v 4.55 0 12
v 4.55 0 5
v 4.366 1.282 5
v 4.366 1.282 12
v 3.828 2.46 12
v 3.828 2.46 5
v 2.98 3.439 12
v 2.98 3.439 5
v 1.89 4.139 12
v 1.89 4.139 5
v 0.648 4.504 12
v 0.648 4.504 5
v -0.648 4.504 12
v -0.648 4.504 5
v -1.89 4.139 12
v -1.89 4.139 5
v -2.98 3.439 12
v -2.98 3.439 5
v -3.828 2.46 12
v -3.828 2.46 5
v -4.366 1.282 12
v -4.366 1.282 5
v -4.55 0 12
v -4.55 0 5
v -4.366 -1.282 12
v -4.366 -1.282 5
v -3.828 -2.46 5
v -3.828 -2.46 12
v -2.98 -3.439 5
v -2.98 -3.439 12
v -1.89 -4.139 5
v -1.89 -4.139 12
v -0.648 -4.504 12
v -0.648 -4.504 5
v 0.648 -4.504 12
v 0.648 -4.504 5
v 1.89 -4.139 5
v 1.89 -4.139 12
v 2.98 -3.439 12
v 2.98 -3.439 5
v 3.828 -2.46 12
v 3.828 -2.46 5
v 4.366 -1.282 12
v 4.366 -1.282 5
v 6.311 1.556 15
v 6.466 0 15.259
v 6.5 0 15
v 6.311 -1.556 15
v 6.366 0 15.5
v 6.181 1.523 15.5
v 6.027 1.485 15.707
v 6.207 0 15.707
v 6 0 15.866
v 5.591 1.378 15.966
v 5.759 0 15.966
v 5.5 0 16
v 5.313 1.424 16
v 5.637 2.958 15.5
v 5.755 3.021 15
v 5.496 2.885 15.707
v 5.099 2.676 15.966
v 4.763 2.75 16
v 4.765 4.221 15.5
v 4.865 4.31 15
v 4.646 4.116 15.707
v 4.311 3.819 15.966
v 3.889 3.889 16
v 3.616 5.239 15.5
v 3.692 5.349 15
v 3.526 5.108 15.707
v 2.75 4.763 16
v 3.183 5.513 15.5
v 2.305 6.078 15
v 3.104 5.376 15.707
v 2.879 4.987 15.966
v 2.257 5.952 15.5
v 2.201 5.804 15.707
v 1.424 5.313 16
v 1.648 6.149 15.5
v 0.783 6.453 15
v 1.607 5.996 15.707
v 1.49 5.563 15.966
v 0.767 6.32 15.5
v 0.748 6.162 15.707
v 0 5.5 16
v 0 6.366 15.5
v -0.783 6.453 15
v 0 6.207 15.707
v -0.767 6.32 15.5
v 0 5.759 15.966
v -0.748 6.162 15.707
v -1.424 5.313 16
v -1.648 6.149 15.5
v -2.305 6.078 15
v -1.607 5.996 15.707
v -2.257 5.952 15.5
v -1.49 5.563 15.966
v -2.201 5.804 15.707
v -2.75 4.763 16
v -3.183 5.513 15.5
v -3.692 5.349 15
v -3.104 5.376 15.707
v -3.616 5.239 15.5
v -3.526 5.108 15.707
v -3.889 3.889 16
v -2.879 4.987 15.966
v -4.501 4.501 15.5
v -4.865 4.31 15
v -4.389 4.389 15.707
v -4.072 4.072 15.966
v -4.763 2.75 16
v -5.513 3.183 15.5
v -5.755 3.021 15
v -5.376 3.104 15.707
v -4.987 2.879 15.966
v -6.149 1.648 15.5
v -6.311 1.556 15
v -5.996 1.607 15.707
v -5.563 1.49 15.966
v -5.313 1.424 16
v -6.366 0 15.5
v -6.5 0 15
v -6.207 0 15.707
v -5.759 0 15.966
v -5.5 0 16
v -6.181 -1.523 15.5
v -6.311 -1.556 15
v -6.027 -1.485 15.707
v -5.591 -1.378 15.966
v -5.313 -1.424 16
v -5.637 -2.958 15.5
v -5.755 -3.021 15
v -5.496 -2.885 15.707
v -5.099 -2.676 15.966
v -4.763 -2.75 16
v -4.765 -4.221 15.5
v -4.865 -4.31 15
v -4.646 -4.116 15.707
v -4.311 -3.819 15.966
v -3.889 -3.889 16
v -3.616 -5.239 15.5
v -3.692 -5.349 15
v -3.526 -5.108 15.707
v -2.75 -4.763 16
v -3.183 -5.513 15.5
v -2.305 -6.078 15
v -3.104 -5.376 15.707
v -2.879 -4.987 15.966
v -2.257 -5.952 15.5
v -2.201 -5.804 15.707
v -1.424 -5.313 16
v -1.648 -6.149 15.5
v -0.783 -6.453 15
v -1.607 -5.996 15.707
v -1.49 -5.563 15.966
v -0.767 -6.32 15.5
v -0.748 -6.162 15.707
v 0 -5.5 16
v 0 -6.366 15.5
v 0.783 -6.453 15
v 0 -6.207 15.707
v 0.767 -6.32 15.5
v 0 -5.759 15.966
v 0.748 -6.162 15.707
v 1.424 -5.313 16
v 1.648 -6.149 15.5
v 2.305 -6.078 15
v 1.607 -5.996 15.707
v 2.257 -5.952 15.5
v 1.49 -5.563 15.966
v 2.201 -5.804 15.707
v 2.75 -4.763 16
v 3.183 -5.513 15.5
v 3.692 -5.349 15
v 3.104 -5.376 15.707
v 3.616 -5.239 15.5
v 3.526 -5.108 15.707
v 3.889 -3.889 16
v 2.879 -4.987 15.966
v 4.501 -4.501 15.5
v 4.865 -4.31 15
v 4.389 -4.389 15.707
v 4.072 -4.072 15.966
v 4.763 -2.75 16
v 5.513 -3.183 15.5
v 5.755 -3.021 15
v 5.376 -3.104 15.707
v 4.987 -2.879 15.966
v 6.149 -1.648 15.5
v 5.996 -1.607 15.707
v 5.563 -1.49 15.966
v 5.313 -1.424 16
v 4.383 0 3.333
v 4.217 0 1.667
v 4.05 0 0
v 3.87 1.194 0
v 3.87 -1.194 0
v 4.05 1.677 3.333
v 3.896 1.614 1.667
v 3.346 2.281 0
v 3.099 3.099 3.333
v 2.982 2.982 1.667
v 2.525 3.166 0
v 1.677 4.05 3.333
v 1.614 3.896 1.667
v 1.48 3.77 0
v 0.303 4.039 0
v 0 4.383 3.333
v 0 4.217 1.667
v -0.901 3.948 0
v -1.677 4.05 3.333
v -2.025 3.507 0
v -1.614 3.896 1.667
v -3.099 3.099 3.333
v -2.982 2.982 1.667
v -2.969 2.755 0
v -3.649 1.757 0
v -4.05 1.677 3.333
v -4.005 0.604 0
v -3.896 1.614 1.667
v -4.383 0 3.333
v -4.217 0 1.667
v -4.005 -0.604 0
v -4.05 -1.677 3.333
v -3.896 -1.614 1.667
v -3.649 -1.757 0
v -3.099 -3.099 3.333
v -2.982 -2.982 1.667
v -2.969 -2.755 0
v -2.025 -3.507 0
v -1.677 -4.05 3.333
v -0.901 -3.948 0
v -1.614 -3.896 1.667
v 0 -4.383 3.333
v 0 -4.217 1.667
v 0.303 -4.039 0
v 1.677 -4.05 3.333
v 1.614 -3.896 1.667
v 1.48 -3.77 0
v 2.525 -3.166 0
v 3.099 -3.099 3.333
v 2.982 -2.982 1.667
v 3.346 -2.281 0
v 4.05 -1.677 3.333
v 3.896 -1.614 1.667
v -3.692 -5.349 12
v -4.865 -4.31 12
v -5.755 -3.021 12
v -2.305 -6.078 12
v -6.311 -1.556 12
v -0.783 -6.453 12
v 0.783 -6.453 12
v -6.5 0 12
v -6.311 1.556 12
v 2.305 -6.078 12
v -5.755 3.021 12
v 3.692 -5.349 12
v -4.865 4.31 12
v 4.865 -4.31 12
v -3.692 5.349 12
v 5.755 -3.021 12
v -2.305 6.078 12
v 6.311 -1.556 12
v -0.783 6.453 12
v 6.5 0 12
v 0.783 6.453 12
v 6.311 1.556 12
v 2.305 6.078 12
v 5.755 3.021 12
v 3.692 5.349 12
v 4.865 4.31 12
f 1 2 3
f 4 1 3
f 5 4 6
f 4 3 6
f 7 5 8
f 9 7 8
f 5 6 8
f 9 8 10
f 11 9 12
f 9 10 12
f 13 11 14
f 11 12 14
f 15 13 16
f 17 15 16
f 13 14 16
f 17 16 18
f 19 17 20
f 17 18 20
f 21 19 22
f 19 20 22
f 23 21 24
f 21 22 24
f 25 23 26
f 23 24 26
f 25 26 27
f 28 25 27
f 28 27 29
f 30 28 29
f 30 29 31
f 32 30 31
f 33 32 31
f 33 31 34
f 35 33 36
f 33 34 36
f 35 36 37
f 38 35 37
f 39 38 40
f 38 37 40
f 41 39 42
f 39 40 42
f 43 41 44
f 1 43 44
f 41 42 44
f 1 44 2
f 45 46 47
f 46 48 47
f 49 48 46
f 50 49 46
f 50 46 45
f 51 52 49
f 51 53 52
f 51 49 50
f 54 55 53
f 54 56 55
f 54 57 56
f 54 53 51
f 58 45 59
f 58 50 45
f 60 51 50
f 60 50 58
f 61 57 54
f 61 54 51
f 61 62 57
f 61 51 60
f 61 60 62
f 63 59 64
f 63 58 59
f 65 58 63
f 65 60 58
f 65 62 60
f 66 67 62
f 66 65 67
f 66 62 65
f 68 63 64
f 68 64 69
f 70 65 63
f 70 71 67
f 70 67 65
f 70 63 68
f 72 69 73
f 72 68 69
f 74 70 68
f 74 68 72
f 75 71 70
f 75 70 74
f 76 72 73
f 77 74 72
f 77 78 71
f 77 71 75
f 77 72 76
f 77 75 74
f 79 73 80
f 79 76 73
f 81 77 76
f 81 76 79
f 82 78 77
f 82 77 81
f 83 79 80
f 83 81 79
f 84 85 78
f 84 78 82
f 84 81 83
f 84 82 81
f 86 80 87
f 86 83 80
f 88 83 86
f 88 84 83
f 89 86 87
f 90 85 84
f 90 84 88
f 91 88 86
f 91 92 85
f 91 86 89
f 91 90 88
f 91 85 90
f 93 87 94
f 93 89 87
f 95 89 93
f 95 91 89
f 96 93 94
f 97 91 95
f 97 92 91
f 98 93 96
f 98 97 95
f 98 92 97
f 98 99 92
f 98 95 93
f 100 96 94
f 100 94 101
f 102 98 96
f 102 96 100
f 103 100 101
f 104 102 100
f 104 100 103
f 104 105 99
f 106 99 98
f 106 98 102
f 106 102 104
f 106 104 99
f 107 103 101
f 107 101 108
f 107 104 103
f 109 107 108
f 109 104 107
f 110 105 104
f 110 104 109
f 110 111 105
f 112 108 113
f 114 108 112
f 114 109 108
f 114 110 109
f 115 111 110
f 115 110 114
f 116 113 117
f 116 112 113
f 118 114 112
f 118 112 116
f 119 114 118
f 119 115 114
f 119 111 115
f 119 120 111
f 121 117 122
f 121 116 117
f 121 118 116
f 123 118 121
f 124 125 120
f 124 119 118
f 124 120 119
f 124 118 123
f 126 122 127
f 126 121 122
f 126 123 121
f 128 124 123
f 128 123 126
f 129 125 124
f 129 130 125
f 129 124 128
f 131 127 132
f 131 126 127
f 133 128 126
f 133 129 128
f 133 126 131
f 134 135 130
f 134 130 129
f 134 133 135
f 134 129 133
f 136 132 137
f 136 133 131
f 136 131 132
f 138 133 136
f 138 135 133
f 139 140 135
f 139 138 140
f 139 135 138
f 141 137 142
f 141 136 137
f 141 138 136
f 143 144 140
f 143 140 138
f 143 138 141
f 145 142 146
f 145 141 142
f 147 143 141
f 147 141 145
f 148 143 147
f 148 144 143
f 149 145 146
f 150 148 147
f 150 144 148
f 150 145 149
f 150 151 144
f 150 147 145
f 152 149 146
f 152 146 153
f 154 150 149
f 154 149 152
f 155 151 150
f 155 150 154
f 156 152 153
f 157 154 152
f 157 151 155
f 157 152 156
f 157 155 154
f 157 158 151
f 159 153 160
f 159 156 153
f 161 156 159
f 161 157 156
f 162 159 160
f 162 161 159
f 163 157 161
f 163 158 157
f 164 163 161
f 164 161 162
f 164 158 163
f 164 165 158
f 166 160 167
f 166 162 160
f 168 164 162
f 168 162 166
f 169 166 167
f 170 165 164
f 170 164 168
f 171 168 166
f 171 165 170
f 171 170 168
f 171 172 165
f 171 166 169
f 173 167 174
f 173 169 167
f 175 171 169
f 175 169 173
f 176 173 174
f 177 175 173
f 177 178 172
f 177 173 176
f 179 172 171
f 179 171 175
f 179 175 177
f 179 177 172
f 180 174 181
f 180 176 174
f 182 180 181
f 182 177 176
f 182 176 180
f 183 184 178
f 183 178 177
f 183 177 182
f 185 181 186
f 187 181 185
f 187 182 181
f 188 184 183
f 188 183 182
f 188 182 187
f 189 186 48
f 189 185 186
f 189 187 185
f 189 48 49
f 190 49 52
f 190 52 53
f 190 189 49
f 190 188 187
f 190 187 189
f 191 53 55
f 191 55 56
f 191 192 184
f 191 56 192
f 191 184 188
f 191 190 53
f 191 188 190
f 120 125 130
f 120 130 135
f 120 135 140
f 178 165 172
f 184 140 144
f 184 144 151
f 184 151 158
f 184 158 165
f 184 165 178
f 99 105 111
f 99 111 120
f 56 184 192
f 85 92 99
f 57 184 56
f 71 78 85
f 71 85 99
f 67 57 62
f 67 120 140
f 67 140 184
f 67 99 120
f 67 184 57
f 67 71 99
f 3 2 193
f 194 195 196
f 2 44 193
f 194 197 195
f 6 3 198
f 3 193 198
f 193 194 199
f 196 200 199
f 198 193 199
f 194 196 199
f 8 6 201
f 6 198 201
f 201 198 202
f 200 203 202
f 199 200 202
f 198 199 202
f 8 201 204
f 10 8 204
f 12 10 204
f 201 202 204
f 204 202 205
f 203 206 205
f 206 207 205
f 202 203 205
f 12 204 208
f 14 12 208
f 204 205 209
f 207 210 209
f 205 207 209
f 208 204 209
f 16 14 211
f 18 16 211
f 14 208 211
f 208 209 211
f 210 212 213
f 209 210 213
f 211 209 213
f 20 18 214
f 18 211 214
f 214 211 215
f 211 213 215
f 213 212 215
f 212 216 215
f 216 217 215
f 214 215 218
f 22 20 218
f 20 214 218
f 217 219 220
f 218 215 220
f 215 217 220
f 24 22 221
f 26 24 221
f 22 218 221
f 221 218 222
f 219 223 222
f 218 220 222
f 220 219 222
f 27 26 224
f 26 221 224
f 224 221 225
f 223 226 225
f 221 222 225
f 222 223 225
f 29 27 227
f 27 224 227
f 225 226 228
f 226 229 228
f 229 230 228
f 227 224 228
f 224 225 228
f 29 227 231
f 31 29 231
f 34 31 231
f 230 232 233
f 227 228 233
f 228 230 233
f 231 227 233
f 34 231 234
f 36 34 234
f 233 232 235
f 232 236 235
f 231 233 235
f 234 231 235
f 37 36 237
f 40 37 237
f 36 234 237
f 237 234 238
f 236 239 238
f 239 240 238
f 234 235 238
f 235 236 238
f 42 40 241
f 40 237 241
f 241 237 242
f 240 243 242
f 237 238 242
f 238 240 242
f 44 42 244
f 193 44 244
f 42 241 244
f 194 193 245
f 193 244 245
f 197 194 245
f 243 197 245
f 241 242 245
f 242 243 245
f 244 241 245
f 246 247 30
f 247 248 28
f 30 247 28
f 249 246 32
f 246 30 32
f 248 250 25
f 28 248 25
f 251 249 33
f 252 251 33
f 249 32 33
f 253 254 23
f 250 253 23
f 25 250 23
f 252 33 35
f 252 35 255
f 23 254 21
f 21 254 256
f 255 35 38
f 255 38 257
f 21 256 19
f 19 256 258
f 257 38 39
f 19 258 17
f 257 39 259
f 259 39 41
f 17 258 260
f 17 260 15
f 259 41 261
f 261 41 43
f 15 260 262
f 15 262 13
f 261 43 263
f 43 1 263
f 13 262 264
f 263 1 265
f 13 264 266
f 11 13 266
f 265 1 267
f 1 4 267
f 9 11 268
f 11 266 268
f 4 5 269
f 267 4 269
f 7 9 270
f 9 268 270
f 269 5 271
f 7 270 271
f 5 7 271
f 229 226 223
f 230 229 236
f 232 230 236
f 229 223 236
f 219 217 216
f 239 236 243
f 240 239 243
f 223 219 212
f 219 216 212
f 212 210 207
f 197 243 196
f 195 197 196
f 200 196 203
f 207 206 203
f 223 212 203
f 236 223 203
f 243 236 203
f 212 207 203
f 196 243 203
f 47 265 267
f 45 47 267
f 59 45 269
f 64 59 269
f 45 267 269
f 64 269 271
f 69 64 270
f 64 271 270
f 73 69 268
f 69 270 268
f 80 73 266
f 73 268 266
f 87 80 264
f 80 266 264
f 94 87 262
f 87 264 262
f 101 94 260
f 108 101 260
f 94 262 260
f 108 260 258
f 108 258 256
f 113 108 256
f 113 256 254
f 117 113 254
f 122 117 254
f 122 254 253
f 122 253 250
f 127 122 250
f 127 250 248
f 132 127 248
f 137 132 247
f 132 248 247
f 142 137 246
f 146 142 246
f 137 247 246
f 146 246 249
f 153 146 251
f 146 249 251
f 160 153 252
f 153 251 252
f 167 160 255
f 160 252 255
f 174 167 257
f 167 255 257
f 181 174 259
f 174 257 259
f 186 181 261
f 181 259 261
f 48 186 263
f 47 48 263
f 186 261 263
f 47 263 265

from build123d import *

# Parameters (mm, degrees)
F0_R     = 4.55
F1_DEPTH = 12
F2_SIZE2 = 0.5
F2_SIZE  = 5
F3_R     = 6.5
F3_R_2   = 4.55
F4_DEPTH = 4
F5_R     = 1


with BuildPart() as f1:
    # F0 (on Top) → F1 (new body)
    with BuildSketch(Plane.XY):
        Circle(F0_R)
    extrude(amount=F1_DEPTH)

    # F2
    f2_edges = [f1.edges().sort_by_distance(p)[0] for p in [
        (-4.55, 0, 0),
    ]]
    chamfer(f2_edges, length=F2_SIZE, length2=F2_SIZE2)

    # F3 (on face) → F4 (join)
    with BuildSketch(Plane.XY.offset(12)):
        Circle(F3_R)
        Circle(F3_R_2, mode=Mode.SUBTRACT)
        Circle(F3_R_2)
    extrude(amount=F4_DEPTH)

    # F5
    f5_edges = [f1.edges().sort_by_distance(p)[0] for p in [
        (-6.5, 0, 16),
    ]]
    fillet(f5_edges, radius=F5_R)


solid = f1.part
